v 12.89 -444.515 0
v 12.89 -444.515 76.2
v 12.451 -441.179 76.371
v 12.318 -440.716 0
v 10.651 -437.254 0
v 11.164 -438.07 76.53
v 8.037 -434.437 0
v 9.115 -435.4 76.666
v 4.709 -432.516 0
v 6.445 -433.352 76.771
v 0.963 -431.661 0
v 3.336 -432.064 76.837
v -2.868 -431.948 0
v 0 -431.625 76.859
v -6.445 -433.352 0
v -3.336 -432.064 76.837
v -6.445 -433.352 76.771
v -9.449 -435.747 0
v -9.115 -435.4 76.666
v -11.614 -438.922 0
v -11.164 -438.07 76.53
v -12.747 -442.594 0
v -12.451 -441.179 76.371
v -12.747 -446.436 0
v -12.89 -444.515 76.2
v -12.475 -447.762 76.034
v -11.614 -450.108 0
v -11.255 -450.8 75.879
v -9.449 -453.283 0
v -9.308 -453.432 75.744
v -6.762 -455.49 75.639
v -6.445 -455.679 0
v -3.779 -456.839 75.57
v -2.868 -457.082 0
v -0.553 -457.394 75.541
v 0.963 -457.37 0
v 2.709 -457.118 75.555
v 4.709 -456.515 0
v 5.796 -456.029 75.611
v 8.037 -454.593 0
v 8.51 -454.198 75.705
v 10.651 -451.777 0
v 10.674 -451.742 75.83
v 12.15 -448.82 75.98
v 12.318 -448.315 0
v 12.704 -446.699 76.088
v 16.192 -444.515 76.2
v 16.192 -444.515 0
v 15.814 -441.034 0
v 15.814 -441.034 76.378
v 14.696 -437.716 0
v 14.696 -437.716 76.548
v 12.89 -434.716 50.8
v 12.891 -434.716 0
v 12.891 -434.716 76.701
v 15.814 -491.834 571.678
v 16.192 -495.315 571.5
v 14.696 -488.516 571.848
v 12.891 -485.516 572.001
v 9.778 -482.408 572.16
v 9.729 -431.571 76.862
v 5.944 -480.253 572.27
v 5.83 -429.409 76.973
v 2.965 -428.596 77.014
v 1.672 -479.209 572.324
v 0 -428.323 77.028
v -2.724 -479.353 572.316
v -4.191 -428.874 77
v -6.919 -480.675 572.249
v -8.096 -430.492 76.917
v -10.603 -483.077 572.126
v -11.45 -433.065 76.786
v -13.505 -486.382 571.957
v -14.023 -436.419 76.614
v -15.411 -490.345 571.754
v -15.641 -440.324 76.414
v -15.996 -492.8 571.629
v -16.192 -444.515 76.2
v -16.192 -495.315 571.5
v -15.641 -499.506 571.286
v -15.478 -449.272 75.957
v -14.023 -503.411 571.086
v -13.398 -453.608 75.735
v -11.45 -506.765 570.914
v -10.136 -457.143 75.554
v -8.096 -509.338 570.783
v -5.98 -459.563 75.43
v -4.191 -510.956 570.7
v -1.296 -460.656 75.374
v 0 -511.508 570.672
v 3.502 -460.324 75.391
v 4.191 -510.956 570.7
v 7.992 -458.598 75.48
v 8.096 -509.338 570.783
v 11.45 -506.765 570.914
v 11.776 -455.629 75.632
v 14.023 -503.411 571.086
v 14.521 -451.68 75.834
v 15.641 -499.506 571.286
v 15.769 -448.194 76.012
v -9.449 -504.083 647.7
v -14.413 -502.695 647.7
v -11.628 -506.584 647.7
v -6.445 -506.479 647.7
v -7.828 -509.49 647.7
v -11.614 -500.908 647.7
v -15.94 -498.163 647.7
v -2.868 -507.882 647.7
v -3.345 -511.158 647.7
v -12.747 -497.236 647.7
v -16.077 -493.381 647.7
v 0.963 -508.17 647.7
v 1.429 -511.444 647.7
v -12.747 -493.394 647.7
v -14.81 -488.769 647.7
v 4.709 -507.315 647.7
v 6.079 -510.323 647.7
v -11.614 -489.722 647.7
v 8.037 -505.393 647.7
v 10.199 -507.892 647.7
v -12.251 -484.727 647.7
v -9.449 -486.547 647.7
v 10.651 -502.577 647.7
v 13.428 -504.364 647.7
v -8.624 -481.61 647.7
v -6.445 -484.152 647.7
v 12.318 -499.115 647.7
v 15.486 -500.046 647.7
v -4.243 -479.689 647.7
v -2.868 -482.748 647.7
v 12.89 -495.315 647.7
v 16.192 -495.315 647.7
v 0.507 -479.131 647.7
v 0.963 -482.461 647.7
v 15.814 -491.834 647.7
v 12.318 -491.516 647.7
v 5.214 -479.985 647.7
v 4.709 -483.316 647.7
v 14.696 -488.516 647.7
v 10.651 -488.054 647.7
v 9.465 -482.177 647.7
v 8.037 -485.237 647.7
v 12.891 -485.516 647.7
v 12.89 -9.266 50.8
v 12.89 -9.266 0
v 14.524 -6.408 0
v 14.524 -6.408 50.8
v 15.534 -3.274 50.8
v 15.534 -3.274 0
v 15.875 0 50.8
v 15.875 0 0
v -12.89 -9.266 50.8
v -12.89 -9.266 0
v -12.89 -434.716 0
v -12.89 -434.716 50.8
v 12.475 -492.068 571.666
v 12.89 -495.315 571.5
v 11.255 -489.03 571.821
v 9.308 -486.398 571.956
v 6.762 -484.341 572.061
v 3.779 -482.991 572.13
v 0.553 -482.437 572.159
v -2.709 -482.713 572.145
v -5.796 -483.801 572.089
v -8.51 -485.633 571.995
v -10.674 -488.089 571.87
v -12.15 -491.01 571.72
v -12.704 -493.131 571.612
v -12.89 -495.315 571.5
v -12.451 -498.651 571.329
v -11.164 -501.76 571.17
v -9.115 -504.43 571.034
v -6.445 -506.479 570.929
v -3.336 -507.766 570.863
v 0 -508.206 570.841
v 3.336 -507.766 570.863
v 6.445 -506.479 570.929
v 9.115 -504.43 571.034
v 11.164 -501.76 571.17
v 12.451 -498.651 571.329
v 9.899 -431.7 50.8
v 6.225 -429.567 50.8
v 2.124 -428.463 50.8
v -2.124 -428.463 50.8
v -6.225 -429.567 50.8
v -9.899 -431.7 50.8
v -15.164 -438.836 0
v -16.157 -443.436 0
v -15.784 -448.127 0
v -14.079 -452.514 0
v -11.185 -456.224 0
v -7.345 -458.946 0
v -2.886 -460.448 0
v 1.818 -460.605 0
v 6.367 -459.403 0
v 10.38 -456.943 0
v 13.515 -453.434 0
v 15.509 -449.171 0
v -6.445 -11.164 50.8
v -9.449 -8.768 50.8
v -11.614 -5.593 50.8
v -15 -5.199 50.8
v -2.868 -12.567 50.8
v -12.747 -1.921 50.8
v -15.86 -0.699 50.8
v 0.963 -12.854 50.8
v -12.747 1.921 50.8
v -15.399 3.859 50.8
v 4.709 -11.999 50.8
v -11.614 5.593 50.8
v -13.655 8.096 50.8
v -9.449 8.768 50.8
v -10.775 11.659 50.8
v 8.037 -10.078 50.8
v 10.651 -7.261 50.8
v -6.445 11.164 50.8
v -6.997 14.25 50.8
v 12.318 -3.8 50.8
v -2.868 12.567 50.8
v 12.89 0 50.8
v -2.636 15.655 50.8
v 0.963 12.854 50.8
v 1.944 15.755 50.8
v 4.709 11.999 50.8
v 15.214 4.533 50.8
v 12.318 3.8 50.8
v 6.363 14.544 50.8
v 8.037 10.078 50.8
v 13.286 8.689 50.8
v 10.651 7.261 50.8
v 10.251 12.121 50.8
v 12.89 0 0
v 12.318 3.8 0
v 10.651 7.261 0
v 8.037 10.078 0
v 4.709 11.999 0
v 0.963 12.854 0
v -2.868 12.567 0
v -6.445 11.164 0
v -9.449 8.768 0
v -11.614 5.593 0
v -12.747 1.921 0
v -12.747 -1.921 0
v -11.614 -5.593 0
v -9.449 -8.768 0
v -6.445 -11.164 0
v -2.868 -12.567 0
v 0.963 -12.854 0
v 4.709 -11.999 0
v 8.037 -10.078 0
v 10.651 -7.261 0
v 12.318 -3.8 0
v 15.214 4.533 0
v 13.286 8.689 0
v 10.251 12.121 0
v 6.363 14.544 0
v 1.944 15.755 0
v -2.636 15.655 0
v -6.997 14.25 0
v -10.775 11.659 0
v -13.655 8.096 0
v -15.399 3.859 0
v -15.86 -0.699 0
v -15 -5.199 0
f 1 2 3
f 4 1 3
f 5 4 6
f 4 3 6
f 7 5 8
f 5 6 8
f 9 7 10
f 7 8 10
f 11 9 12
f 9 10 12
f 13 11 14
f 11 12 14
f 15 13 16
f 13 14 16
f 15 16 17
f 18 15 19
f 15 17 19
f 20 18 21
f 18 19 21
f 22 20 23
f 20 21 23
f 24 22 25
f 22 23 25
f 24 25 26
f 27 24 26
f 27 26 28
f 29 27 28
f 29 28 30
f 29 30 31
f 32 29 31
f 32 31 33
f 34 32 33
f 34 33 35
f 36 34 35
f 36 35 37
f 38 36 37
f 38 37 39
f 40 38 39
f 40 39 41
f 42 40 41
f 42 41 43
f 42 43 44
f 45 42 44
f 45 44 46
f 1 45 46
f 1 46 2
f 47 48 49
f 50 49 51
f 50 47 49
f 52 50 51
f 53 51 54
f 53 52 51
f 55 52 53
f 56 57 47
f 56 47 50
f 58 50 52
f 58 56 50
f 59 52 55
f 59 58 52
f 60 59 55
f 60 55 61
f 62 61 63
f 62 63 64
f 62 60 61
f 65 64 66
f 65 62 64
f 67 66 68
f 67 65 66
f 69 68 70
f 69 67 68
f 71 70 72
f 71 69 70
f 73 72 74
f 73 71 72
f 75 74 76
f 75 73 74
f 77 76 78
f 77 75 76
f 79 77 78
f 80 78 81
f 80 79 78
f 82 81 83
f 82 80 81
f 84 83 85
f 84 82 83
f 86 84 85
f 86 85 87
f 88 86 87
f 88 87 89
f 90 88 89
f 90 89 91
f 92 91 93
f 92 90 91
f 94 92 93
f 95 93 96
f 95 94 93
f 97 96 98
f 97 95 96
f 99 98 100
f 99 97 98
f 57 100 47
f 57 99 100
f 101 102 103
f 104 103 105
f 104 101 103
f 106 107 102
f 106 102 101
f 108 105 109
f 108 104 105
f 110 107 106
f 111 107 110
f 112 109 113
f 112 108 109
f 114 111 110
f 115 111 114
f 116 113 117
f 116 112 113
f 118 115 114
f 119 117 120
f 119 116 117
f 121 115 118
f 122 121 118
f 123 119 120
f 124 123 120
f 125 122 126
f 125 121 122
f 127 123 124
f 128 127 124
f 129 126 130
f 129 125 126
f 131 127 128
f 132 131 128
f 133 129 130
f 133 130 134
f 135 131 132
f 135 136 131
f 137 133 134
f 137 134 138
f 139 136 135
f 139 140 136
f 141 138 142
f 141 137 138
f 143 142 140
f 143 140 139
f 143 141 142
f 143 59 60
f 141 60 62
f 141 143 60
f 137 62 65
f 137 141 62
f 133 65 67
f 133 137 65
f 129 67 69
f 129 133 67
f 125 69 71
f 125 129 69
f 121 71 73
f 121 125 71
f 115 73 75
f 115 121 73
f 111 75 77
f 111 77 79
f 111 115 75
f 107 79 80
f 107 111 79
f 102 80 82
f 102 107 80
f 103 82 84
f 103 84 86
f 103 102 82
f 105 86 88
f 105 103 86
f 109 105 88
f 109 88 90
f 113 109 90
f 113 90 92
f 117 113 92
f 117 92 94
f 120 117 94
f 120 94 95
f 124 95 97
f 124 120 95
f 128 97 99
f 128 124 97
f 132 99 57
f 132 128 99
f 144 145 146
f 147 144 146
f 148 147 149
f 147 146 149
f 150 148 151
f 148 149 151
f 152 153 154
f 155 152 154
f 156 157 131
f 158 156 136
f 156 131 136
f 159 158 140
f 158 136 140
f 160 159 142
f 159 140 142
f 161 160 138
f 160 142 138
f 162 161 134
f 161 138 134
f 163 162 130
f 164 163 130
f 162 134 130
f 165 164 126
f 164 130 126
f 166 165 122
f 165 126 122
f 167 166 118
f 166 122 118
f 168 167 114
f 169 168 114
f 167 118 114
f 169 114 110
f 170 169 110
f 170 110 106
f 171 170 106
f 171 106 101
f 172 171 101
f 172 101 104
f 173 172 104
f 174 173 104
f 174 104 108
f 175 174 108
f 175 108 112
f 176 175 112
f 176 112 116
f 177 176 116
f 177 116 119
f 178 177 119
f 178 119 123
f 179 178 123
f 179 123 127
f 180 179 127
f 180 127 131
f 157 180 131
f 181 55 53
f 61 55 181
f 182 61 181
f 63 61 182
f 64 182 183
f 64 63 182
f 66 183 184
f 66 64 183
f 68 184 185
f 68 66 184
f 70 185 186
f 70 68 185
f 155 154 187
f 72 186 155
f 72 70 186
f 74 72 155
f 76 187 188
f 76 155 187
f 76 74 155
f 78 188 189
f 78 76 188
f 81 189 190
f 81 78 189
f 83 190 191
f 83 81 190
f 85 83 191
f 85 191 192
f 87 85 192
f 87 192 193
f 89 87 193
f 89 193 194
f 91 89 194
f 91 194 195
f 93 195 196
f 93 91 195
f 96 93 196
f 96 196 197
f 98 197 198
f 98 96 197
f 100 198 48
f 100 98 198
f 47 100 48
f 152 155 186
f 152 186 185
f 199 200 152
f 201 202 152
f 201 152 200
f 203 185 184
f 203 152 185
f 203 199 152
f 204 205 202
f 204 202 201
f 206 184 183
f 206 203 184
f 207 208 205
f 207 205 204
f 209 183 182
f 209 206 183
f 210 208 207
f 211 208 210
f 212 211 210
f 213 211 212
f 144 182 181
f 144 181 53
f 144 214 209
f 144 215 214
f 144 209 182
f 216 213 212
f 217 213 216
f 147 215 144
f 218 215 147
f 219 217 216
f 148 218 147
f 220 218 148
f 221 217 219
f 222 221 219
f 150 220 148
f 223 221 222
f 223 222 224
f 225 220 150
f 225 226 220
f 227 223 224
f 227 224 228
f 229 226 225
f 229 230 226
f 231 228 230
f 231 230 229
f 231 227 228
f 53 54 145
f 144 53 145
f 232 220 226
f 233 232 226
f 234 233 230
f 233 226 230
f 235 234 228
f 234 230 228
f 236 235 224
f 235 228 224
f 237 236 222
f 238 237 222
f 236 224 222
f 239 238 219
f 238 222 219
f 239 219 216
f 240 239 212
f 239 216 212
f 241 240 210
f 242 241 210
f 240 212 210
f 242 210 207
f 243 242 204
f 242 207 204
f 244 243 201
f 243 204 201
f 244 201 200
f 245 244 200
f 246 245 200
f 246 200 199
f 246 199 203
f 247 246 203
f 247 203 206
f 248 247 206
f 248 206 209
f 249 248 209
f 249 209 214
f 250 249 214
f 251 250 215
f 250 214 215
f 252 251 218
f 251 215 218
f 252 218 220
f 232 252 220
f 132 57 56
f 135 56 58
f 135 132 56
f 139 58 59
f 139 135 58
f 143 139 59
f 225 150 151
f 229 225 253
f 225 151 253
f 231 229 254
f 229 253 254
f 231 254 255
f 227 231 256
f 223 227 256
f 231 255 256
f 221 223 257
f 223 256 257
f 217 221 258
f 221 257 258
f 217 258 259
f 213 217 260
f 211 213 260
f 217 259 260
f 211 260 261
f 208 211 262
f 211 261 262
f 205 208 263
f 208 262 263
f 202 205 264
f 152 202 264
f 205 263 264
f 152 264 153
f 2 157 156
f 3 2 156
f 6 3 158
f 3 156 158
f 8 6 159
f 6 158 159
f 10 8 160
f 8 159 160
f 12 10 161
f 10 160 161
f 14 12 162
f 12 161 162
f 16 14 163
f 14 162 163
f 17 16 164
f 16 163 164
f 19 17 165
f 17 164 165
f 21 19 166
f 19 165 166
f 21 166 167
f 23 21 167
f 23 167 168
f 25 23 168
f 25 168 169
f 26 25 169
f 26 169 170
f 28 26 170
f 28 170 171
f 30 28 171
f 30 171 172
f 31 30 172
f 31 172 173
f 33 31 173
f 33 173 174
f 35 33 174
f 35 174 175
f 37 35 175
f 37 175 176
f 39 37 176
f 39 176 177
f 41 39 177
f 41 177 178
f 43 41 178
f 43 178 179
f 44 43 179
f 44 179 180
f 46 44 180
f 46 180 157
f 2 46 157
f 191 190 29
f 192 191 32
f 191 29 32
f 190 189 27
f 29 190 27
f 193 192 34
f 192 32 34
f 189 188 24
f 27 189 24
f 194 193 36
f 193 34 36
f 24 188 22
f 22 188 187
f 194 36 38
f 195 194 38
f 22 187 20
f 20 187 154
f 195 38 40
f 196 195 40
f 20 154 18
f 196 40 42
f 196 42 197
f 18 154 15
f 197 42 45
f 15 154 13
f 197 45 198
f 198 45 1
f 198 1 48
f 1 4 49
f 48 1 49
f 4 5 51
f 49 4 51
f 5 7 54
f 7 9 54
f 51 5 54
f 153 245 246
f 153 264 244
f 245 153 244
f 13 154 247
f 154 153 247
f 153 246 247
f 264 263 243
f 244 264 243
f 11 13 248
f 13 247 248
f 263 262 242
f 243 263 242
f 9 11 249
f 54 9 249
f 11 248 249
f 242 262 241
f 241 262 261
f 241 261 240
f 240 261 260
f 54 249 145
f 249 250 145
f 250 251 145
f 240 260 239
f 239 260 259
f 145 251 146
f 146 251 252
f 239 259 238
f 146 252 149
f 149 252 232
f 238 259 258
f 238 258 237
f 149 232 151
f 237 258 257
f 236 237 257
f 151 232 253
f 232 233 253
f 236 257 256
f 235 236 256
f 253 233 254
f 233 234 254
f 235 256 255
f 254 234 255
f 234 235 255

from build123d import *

# Parameters (mm, degrees)
F1_DEPTH = 50.8
F2_R     = 12.8905
F3_DEPTH = 50.8
F0_R     = 12.8905


with BuildPart() as f1:
    # F0 (on Top) → F1 (new body)
    with BuildSketch(Plane.XY):
        with BuildLine():
            ThreePointArc((12.8905, -9.2655617612), (15.1104651235, -4.8671828351), (15.875, 0))
            ThreePointArc((15.875, 0), (-4.8671828351, 15.1104651235), (-12.8905, -9.2655617612))
            ThreePointArc((-12.8905, -9.2655617612), (0, -15.875), (12.8905, -9.2655617612))
        make_face()
        with BuildLine():
            ThreePointArc((12.8905, -9.2655617612), (0, -15.875), (-12.8905, -9.2655617612))
            Line((-12.8905, -9.2655617612), (-12.8905, -221.9905617612))
            Line((-12.8905, -221.9905617612), (12.8905, -221.9905617612))
            Line((12.8905, -221.9905617612), (12.8905, -9.2655617612))
        make_face()
        with BuildLine():
            Line((12.8905, -221.9905617612), (-12.8905, -221.9905617612))
            Line((-12.8905, -221.9905617612), (-12.8905, -434.7155617612))
            ThreePointArc((-12.8905, -434.7155617612), (0, -428.3226569569), (12.8905, -434.7155617612))
            Line((12.8905, -434.7155617612), (12.8905, -221.9905617612))
        make_face()
    extrude(amount=F1_DEPTH)

    # F2 (on face) → F3 (cut, through all)
    with BuildSketch(Plane.XY.offset(50.8)):
        Circle(F2_R)
    extrude(amount=-F3_DEPTH, mode=Mode.SUBTRACT)

    # F5: sweep along a path in F4
    with BuildLine(Plane.YZ) as f5_path:
        Line((-444.5151569569, 0), (-444.5151569569, 76.2))
        Line((-444.5151569569, 76.2), (-495.3151569569, 571.5))
        Line((-495.3151569569, 571.5), (-495.3151569569, 647.7))
    # F0 (on Top) → F5 (sweep)
    with BuildSketch(Plane.XY):
        with BuildLine():
            ThreePointArc((12.8905, -434.7155617612), (0, -428.3226569569), (-12.8905, -434.7155617612))
            ThreePointArc((-12.8905, -434.7155617612), (-5.1704755584, -459.8599684171), (16.1925, -444.5151569569))
            ThreePointArc((16.1925, -444.5151569569), (15.3448114602, -439.3446813985), (12.8905, -434.7155617612))
        make_face()
        with Locations((0, -444.5151569569)):
            Circle(F0_R, mode=Mode.SUBTRACT)
    sweep(path=f5_path.line, transition=Transition.RIGHT)


solid = f1.part
